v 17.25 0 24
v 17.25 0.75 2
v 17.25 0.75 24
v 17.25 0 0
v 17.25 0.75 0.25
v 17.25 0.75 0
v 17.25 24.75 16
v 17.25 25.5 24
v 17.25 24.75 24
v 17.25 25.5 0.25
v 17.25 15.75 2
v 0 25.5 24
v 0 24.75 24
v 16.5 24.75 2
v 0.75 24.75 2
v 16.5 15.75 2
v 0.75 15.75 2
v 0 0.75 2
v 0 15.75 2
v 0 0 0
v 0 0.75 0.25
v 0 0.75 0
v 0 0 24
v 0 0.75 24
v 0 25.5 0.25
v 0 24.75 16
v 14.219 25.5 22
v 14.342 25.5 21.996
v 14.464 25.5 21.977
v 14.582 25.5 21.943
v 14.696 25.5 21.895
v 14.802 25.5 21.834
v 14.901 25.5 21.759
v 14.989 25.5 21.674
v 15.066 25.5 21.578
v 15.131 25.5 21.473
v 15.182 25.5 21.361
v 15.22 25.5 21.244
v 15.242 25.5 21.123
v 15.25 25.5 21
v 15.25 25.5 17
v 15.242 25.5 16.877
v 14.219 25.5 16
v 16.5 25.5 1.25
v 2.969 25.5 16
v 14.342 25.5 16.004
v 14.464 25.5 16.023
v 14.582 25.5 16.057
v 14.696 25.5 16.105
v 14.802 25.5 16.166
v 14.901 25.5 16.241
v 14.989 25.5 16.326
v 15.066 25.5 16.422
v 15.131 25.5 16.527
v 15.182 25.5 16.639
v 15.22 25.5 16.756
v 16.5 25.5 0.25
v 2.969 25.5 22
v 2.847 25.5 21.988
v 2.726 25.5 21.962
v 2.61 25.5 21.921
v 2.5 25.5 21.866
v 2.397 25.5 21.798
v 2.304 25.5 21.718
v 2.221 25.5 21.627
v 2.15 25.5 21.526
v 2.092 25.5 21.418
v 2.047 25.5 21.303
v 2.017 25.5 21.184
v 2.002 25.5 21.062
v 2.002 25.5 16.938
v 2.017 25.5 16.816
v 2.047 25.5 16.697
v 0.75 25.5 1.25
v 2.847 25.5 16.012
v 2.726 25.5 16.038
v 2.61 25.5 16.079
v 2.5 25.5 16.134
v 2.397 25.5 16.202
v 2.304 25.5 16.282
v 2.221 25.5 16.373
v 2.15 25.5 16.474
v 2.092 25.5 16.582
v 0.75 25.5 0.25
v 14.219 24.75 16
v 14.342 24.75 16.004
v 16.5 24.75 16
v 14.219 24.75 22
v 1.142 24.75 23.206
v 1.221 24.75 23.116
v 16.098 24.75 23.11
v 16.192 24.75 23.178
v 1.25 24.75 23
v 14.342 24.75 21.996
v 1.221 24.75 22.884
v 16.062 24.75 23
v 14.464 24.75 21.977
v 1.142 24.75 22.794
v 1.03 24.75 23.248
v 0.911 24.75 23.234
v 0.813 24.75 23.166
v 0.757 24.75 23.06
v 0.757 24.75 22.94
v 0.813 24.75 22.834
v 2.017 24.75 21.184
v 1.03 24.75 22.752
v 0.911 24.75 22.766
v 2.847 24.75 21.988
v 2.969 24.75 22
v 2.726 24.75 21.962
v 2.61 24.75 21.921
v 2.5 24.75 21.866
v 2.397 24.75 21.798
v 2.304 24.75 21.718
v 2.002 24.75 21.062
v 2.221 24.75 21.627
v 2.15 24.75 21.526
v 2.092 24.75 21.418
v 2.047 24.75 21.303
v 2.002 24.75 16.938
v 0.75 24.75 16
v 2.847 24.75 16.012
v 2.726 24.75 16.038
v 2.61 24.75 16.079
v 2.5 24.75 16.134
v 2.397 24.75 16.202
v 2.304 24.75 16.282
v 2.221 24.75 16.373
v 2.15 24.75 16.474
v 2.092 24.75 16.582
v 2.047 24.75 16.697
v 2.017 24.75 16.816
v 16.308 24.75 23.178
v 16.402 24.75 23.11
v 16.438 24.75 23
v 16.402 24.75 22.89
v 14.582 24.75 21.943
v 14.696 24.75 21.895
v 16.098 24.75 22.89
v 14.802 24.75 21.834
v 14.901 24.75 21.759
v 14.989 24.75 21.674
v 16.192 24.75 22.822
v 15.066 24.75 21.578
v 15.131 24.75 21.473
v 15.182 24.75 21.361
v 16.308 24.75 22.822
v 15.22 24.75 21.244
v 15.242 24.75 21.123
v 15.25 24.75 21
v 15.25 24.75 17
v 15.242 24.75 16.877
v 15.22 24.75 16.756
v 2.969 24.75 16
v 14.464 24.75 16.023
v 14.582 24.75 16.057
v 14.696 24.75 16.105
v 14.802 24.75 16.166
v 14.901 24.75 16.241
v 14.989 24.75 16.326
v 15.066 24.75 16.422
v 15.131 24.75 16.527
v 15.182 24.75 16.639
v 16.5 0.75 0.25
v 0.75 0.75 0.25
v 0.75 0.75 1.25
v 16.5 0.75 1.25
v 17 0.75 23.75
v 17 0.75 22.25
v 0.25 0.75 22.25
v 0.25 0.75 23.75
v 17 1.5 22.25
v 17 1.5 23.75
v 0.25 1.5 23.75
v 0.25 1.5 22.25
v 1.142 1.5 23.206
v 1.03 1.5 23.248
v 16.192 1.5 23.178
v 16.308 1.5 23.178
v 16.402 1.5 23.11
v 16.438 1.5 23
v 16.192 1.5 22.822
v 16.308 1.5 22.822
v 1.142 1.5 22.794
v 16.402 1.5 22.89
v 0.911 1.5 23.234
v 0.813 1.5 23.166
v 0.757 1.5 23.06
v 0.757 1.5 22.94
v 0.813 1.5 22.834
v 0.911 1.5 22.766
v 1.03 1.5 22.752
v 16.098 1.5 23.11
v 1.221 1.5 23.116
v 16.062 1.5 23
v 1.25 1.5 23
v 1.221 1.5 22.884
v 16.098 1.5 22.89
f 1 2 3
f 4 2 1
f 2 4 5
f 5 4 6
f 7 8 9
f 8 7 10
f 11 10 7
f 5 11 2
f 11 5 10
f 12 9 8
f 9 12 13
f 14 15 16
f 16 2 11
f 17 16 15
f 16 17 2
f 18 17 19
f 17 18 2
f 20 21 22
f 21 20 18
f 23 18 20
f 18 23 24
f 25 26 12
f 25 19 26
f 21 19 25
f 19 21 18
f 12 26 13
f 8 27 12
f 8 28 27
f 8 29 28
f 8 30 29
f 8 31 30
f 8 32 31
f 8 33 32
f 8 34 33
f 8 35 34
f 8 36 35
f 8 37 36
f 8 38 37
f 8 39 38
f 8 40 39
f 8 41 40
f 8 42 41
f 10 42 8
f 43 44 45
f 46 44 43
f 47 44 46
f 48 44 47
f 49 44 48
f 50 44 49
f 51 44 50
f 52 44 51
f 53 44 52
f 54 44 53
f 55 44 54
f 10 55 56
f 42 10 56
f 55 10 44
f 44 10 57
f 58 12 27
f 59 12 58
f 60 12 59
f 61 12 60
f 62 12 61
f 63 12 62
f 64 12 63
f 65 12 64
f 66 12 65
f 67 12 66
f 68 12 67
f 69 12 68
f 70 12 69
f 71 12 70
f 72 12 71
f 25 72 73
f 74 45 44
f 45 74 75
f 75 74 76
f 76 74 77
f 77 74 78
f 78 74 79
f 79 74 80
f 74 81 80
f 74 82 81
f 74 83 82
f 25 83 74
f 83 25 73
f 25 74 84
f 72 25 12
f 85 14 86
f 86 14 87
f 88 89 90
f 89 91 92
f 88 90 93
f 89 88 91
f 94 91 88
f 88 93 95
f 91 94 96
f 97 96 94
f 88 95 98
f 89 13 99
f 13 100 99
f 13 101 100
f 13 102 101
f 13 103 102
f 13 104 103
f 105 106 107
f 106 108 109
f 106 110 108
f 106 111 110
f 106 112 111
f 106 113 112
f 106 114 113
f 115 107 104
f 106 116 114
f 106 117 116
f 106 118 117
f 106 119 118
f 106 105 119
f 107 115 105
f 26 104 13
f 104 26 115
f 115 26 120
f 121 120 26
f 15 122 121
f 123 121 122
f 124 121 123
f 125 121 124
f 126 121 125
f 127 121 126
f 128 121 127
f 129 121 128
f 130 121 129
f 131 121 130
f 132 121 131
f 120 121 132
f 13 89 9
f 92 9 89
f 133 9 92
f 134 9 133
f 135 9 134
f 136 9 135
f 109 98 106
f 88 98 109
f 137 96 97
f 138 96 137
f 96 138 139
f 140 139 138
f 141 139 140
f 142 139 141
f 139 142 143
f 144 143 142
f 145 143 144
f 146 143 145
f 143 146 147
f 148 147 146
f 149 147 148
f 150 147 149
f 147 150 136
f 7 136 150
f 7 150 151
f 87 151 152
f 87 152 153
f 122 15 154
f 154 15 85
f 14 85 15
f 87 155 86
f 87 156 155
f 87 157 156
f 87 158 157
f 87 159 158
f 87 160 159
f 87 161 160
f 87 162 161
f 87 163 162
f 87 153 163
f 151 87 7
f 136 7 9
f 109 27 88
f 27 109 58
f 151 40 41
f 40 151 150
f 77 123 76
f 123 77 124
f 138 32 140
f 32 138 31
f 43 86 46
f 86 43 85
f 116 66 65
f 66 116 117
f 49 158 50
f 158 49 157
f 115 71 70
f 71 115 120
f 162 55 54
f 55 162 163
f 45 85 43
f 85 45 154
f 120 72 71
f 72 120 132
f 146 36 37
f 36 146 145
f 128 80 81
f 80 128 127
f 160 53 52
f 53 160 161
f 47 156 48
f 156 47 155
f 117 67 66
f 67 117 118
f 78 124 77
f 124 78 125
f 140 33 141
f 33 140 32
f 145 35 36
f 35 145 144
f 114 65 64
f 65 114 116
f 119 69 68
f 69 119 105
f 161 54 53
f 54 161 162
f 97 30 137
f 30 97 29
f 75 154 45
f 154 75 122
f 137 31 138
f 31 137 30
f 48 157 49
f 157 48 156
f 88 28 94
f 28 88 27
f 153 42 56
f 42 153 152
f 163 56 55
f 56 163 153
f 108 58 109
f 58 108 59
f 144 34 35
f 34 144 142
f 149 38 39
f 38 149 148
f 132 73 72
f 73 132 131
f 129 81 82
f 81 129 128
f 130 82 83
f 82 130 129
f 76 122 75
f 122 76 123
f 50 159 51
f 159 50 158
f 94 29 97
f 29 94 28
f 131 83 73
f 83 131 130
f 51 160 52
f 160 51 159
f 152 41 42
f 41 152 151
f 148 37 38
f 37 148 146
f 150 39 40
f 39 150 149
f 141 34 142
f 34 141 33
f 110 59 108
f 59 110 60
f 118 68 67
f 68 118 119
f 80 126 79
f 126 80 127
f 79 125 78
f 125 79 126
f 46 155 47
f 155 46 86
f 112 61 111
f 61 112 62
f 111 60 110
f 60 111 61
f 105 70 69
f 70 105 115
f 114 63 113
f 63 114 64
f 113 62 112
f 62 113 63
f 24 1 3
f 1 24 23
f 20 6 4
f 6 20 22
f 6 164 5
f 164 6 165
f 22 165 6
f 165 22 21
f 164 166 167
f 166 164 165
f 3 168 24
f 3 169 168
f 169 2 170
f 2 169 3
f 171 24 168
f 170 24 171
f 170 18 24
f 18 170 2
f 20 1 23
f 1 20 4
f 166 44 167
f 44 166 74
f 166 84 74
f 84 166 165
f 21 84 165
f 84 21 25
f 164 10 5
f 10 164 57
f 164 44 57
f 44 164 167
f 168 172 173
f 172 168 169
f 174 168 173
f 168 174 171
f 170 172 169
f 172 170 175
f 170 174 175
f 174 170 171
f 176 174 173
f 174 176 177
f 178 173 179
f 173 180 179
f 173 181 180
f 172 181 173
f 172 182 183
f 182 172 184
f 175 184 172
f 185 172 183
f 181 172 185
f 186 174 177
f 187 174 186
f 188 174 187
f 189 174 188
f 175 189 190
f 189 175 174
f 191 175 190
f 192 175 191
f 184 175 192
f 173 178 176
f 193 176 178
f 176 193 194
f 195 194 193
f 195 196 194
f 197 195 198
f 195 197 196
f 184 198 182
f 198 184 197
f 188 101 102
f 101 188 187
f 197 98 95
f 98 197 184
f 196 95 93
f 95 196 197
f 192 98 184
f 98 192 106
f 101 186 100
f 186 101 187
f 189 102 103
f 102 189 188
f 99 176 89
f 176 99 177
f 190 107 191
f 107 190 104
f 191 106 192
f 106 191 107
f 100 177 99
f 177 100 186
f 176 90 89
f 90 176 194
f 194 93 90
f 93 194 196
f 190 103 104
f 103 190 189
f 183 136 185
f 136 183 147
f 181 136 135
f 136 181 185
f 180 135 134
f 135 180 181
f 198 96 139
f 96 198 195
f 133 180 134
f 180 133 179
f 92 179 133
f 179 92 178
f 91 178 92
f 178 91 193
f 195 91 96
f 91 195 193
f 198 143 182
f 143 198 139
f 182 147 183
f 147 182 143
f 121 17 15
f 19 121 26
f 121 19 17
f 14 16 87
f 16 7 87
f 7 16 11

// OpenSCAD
function width() = 17.25;
function interior_height() = 22;
function height() = interior_height() + 2;
function interior_depth() = 24;

function walnut() = [0.247, 0.165, 0.078];
function lightwalnut() = [0.397, 0.315, 0.228];
function maple() = "tan";

$fa = 1;
$fs = 0.125;

union() {
  translate([0, 0, 0]) {
    color(lightwalnut()) cube([width(), 0.75, height()]);
  }
  translate([0, interior_depth() + 0.75, 2]) {
    difference() {
      color(maple()) cube([width(), 0.75, interior_height()]);
      translate([2 + 1, -0.25, height() + 1 - 10]) {
        color(maple()) minkowski() {
          rotate([-90,0,0]) {
            cylinder(d=2, h=1.25);
          }
          cube([width() - 6, 1.25, 4]);
        }
      }
    }
  }
  translate([0, 0.75, 2 - 0.75]) {
    color(maple()) cube([width(), interior_depth() + 0.75, 0.75]);
  }
  translate([0, 0.75, 0.25]) {
    color(maple()) cube([0.75, interior_depth()+0.75, 1]);
  }
  translate([width()-0.75, 0.75, 0.25]) {
    color(maple()) cube([0.75, interior_depth()+0.75, 1]);
  }
  translate([0.25, 0.75, height() - 1.75]) {
    color(maple()) cube([width()-0.5, 0.75, 1.5]);
  }
  translate([1, 0.25, height() - 1]) {
    rotate([-90, 0, 0]) {
      color("silver") cylinder(d = 0.5, h = interior_depth() + 1);
    }
  }
  translate([width() - 1, 0.25, height() - 1]) {
    rotate([-90, 0, 0]) {
      color("silver") cylinder(d = 0.375, h = interior_depth() + 1);
    }
  }
  translate([0, interior_depth() + 0.75, 2]) {
    rotate([90, 0, 90]) {
      color(maple()) linear_extrude(0.75) {
        polygon([[0, 0], [3-interior_depth()/2, 0], [0, interior_height() - 8]]);
      }
    }
  }
  translate([width() - 0.75, interior_depth() + 0.75, 2]) {
    rotate([90, 0, 90]) {
      color(maple()) linear_extrude(0.75) {
        color(maple()) polygon([[0, 0], [3-interior_depth()/2, 0], [0, interior_height() - 8]]);
      }
    }
  }
}
